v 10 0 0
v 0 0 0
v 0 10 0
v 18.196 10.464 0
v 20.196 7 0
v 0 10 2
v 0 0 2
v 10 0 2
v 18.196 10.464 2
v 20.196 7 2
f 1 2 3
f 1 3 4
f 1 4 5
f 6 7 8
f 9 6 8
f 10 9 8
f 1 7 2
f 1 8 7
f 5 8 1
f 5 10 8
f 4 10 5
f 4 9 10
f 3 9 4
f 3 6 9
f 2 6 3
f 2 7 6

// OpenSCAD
linear_extrude(2) hull() { square(10); translate([15, 4]) rotate(30) square([6, 4]); }
